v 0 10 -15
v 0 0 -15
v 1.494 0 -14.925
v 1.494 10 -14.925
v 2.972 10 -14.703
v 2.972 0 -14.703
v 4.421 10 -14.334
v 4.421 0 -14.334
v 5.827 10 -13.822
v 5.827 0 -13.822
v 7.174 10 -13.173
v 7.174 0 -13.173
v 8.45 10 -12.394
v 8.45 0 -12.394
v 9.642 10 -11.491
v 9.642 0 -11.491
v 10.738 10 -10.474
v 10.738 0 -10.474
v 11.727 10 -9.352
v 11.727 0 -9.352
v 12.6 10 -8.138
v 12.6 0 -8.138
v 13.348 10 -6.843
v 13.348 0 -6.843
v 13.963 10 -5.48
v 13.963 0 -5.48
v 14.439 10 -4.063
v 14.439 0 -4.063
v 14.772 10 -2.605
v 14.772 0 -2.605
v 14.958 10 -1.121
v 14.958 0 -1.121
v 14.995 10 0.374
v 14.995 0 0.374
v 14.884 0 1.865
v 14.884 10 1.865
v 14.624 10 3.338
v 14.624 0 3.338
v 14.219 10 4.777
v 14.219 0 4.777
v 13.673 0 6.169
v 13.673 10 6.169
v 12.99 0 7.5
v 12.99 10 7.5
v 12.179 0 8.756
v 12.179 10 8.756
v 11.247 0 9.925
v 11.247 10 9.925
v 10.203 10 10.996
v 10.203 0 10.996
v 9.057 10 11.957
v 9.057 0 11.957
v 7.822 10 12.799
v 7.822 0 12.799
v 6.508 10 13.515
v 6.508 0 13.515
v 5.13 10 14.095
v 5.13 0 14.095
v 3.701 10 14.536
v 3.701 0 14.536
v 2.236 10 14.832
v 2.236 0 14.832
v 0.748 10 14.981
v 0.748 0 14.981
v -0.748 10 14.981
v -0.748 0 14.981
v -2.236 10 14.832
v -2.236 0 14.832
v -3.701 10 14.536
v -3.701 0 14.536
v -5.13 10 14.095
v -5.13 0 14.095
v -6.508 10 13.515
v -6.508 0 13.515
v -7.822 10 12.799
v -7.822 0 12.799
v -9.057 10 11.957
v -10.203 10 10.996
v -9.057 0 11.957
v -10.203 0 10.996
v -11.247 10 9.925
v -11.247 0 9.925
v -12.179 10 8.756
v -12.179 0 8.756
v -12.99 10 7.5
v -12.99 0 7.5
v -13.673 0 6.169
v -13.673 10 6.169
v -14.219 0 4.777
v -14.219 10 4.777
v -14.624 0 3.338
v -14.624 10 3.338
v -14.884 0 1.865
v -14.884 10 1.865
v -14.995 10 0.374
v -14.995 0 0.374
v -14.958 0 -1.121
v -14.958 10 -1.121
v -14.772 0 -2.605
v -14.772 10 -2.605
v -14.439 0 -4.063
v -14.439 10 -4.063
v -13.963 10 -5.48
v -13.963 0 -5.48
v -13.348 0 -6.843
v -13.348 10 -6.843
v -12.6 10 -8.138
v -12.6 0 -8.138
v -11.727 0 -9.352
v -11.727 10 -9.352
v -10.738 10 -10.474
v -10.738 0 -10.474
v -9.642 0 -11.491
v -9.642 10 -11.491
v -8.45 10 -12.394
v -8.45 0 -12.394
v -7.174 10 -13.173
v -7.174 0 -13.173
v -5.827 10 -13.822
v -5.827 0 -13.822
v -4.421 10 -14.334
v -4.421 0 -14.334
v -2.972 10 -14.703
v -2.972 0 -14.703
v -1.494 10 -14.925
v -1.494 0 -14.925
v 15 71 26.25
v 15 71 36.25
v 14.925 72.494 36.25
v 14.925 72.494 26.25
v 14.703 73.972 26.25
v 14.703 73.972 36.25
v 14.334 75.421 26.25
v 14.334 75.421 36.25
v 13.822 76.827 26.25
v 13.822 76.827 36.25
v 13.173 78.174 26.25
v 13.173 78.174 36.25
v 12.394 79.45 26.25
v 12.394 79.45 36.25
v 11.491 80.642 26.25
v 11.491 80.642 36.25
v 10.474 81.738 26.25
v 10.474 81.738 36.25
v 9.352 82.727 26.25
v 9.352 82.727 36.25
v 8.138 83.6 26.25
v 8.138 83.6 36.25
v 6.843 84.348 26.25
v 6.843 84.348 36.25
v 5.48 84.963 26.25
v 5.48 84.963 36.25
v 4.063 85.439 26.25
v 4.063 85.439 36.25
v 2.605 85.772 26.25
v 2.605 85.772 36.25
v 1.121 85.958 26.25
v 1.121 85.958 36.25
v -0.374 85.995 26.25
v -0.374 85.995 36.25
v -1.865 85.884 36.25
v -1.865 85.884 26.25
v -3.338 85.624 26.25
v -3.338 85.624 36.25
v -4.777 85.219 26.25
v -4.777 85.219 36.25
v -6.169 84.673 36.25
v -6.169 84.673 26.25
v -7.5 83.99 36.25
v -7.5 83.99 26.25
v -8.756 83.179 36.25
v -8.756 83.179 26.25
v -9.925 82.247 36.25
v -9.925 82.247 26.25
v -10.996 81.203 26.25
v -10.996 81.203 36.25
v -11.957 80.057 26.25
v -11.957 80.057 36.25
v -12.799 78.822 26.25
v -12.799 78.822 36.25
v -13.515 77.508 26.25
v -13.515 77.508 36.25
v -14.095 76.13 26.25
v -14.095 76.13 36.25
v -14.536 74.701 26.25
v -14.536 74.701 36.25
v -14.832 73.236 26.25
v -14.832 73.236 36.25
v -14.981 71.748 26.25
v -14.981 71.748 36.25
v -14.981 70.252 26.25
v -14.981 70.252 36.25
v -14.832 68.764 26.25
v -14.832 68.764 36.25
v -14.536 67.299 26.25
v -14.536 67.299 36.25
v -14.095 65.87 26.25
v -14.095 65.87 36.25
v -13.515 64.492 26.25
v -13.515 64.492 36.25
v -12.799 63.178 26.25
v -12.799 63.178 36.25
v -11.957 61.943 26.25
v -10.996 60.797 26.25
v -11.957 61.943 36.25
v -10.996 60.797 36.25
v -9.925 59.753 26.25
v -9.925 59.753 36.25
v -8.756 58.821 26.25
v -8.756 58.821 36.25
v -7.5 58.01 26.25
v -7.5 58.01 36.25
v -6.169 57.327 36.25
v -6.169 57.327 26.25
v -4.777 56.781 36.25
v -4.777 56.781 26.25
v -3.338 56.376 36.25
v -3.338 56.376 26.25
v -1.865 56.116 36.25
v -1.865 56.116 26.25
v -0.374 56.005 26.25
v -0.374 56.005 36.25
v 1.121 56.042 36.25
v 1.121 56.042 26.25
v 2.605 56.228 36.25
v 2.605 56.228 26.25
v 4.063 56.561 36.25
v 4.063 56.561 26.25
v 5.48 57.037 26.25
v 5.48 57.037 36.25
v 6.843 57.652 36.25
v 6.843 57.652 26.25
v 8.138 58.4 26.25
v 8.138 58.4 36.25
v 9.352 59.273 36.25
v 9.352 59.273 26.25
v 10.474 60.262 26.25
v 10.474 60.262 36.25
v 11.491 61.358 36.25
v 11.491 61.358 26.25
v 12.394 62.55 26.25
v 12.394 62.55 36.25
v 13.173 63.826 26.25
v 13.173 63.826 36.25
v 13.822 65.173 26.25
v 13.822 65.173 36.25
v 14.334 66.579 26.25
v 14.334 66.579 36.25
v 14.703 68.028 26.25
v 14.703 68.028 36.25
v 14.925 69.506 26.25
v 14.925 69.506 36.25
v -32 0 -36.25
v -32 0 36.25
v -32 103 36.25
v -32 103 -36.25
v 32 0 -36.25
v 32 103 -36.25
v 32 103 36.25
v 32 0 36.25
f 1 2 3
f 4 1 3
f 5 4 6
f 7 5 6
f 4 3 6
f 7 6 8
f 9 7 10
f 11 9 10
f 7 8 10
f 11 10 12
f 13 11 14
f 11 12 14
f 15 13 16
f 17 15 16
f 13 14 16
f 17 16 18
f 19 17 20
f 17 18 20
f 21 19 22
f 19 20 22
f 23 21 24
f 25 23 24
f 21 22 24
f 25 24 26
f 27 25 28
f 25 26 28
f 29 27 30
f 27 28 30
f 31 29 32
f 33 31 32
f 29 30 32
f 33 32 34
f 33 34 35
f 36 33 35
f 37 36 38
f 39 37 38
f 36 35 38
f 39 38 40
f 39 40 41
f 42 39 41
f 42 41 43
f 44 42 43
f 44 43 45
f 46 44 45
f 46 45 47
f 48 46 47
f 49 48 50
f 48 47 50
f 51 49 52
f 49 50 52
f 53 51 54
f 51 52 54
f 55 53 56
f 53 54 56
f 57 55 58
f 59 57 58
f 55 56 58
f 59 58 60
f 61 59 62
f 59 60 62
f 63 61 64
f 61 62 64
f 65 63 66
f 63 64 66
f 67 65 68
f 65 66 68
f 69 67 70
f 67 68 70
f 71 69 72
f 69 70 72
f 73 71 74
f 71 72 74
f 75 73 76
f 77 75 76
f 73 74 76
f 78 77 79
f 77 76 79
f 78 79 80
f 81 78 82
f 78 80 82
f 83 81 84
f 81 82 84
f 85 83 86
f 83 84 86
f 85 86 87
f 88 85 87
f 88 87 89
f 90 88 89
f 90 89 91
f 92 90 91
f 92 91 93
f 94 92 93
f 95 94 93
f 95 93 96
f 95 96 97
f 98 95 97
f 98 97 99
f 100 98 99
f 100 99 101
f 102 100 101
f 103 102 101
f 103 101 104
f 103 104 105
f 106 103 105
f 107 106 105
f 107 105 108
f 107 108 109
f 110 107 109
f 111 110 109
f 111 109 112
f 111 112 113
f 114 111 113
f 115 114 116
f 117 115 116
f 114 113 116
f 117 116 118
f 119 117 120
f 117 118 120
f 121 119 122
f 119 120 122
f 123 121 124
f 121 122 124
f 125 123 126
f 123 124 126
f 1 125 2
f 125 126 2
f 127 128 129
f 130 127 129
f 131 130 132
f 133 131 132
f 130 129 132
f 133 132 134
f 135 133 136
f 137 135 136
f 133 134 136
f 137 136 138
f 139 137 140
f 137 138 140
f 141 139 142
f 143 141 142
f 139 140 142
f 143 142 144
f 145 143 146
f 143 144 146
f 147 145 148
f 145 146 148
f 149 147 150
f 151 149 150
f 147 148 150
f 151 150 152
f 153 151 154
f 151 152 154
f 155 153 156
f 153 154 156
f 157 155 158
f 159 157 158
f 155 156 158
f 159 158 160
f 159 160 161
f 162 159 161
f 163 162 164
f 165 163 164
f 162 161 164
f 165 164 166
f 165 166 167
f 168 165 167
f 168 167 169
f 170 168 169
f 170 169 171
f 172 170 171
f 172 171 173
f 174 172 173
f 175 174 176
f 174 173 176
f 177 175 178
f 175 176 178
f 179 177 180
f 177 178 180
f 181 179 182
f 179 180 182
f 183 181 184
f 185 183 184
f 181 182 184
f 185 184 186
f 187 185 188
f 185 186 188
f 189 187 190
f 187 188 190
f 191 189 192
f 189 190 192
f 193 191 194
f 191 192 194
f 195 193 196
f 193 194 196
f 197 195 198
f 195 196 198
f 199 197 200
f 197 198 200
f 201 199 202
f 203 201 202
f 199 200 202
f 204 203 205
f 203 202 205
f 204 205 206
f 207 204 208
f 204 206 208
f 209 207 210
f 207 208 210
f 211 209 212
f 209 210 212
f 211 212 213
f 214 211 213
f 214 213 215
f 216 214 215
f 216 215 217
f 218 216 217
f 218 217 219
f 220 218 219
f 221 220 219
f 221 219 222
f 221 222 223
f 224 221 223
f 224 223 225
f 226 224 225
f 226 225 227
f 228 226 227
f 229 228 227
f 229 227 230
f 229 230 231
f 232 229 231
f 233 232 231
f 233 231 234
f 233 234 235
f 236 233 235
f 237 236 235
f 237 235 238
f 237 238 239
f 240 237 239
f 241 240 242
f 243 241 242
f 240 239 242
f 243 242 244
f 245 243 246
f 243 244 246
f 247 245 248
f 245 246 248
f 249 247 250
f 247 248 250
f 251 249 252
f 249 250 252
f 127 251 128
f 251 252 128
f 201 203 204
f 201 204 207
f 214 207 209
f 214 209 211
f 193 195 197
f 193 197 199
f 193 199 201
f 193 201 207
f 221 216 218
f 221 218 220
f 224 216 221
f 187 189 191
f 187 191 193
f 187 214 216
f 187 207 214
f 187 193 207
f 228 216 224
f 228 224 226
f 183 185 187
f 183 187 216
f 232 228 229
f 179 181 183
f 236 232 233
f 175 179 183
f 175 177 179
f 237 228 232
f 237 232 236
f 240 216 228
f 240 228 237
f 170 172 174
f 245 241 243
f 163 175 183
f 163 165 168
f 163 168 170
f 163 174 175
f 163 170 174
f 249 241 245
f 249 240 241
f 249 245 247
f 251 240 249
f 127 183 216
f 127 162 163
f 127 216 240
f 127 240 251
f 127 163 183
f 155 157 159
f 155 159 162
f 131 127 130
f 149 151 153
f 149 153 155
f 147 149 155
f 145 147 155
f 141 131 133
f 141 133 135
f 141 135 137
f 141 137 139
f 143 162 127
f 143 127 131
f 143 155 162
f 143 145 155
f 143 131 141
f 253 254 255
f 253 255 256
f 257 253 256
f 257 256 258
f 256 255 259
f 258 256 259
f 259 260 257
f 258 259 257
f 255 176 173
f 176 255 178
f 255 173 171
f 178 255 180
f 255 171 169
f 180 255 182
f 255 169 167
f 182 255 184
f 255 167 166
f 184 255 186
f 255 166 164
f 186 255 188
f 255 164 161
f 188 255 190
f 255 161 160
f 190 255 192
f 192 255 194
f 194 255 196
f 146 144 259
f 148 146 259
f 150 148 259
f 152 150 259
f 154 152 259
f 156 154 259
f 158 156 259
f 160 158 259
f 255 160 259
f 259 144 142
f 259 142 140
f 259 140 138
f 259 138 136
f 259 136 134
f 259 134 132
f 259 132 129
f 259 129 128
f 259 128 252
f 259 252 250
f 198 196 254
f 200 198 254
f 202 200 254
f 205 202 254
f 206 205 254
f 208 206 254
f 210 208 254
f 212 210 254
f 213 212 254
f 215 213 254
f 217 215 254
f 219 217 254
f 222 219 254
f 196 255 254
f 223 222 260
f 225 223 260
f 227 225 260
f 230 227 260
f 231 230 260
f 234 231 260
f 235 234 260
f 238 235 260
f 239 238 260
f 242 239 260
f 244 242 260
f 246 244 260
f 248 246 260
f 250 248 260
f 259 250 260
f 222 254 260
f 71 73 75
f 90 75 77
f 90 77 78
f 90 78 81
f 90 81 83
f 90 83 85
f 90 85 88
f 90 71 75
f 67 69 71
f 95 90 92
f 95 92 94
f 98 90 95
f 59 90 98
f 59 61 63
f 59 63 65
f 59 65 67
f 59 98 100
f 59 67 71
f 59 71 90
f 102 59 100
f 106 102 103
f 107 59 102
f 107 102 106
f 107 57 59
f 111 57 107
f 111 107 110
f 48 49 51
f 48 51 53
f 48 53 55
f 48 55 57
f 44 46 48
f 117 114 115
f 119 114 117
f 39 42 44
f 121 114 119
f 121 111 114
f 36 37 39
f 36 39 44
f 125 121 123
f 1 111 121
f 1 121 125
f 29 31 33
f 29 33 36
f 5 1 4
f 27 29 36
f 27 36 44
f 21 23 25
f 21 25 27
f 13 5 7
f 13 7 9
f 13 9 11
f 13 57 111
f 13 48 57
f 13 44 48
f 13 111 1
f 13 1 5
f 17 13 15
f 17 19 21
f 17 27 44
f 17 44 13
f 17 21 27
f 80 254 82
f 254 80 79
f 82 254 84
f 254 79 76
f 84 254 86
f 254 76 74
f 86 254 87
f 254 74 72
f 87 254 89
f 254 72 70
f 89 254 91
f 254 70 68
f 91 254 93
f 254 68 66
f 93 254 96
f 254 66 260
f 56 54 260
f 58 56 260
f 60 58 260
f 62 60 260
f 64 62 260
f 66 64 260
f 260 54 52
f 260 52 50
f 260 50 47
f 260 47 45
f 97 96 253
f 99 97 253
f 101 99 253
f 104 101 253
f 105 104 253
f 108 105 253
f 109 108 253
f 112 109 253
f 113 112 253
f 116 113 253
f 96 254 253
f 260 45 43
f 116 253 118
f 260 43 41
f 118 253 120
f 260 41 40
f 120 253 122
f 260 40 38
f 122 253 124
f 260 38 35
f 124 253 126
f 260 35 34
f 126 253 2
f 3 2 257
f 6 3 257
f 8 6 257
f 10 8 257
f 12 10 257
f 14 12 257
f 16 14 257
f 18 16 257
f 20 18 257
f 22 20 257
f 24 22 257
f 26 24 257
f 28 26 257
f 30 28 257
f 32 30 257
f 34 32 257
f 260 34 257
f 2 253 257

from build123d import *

# Parameters (mm, degrees)
SKETCH1_W           = 64
SKETCH1_H           = 72.5
BOSS_EXTRUDE1_DEPTH = 103
SKETCH2_R           = 15
CUT_EXTRUDE1_DEPTH  = 10
SKETCH3_R           = 15
CUT_EXTRUDE2_DEPTH  = 10


with BuildPart() as part:
    # Sketch1 → Boss-Extrude1 (new body)
    with BuildSketch(Plane(origin=(0, 0, 0), x_dir=(1, 0, 0), z_dir=(0, 1, 0))):
        Rectangle(SKETCH1_W, SKETCH1_H)
    extrude(amount=BOSS_EXTRUDE1_DEPTH)

    # Sketch2 → Cut-Extrude1 (cut)
    with BuildSketch(Plane.XY.offset(36.25)):
        with Locations((0, 71)):
            Circle(SKETCH2_R)
    extrude(amount=-CUT_EXTRUDE1_DEPTH, mode=Mode.SUBTRACT)

    # Sketch3 → Cut-Extrude2 (cut)
    with BuildSketch(Plane.XZ):
        with Locations(Location((0, 0, 0), (0, 0, 270))):
            Circle(SKETCH3_R)
    extrude(amount=-CUT_EXTRUDE2_DEPTH, mode=Mode.SUBTRACT)


solid = part.part
